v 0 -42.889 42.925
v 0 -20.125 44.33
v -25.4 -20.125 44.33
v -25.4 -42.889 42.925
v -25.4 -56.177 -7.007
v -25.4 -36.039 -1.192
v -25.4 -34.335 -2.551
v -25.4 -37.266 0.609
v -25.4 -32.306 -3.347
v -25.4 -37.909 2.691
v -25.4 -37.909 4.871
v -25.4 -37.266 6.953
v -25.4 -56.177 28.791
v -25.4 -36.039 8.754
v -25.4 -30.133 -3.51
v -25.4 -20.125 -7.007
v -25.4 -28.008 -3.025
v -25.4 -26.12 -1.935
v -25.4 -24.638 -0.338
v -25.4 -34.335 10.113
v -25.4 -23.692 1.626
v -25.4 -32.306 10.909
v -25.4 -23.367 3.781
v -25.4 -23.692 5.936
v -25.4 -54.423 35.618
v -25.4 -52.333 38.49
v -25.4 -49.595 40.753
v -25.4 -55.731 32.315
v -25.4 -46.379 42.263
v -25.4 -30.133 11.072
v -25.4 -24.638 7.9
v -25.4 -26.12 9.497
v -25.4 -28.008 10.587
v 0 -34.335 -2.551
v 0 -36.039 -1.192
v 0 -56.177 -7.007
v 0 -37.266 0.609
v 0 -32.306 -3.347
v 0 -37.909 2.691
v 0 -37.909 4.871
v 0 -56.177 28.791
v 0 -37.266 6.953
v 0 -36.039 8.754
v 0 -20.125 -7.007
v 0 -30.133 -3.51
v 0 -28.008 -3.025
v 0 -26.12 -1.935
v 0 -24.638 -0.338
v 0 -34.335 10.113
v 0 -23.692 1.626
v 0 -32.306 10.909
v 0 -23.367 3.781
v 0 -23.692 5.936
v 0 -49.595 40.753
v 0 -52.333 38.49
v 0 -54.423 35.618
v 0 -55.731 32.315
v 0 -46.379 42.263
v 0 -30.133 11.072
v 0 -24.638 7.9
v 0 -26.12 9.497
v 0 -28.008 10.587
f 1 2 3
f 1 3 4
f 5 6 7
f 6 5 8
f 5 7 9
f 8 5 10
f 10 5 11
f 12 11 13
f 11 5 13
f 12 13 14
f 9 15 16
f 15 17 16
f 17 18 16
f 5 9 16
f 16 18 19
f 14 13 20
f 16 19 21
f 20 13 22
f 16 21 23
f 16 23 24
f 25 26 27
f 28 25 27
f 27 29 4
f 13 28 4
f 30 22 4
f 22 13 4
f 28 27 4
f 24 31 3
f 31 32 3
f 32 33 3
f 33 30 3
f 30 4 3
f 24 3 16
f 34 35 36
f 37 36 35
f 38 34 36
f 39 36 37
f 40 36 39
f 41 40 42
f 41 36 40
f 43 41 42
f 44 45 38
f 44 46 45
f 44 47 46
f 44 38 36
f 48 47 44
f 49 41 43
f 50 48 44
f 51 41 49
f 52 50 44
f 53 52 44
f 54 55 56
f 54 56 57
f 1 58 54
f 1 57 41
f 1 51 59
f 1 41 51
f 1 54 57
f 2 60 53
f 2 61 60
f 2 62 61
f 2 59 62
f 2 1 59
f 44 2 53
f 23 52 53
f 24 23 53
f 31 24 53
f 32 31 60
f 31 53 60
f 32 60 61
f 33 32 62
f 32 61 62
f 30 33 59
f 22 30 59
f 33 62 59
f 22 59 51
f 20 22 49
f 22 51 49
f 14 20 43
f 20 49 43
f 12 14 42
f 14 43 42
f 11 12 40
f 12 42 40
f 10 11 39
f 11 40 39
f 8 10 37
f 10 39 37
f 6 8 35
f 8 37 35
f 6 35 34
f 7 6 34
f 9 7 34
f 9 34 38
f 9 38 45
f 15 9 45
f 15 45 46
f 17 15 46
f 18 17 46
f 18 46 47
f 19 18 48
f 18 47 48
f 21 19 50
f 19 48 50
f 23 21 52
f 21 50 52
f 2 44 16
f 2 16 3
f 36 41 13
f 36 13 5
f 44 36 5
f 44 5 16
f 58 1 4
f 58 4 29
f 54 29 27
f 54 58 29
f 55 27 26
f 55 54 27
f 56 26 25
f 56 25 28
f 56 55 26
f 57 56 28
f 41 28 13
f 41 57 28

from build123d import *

# Parameters (mm, degrees)
F1_DEPTH = 25.4
F2_R     = 7.311466
F3_DEPTH = 25.4


with BuildPart() as f1:
    # F0 (on Right) → F1 (new body)
    with BuildSketch(Plane.YZ):
        with BuildLine():
            ThreePointArc((-42.888714, 42.924615), (-52.333318, 38.490461), (-56.177065, 28.790571))
            Line((-56.177065, 28.790571), (-56.177065, -7.006547))
            Line((-56.177065, -7.006547), (-20.125262, -7.006547))
            Line((-20.125262, -7.006547), (-20.125262, 44.329979))
            Line((-20.125262, 44.329979), (-42.888714, 42.924615))
        make_face()
    extrude(amount=-F1_DEPTH)

    # F2 (on Right) → F3 (cut)
    with BuildSketch(Plane.YZ):
        with Locations((-30.67892, 3.780983)):
            Circle(F2_R)
    extrude(amount=-F3_DEPTH, mode=Mode.SUBTRACT)


solid = f1.part
